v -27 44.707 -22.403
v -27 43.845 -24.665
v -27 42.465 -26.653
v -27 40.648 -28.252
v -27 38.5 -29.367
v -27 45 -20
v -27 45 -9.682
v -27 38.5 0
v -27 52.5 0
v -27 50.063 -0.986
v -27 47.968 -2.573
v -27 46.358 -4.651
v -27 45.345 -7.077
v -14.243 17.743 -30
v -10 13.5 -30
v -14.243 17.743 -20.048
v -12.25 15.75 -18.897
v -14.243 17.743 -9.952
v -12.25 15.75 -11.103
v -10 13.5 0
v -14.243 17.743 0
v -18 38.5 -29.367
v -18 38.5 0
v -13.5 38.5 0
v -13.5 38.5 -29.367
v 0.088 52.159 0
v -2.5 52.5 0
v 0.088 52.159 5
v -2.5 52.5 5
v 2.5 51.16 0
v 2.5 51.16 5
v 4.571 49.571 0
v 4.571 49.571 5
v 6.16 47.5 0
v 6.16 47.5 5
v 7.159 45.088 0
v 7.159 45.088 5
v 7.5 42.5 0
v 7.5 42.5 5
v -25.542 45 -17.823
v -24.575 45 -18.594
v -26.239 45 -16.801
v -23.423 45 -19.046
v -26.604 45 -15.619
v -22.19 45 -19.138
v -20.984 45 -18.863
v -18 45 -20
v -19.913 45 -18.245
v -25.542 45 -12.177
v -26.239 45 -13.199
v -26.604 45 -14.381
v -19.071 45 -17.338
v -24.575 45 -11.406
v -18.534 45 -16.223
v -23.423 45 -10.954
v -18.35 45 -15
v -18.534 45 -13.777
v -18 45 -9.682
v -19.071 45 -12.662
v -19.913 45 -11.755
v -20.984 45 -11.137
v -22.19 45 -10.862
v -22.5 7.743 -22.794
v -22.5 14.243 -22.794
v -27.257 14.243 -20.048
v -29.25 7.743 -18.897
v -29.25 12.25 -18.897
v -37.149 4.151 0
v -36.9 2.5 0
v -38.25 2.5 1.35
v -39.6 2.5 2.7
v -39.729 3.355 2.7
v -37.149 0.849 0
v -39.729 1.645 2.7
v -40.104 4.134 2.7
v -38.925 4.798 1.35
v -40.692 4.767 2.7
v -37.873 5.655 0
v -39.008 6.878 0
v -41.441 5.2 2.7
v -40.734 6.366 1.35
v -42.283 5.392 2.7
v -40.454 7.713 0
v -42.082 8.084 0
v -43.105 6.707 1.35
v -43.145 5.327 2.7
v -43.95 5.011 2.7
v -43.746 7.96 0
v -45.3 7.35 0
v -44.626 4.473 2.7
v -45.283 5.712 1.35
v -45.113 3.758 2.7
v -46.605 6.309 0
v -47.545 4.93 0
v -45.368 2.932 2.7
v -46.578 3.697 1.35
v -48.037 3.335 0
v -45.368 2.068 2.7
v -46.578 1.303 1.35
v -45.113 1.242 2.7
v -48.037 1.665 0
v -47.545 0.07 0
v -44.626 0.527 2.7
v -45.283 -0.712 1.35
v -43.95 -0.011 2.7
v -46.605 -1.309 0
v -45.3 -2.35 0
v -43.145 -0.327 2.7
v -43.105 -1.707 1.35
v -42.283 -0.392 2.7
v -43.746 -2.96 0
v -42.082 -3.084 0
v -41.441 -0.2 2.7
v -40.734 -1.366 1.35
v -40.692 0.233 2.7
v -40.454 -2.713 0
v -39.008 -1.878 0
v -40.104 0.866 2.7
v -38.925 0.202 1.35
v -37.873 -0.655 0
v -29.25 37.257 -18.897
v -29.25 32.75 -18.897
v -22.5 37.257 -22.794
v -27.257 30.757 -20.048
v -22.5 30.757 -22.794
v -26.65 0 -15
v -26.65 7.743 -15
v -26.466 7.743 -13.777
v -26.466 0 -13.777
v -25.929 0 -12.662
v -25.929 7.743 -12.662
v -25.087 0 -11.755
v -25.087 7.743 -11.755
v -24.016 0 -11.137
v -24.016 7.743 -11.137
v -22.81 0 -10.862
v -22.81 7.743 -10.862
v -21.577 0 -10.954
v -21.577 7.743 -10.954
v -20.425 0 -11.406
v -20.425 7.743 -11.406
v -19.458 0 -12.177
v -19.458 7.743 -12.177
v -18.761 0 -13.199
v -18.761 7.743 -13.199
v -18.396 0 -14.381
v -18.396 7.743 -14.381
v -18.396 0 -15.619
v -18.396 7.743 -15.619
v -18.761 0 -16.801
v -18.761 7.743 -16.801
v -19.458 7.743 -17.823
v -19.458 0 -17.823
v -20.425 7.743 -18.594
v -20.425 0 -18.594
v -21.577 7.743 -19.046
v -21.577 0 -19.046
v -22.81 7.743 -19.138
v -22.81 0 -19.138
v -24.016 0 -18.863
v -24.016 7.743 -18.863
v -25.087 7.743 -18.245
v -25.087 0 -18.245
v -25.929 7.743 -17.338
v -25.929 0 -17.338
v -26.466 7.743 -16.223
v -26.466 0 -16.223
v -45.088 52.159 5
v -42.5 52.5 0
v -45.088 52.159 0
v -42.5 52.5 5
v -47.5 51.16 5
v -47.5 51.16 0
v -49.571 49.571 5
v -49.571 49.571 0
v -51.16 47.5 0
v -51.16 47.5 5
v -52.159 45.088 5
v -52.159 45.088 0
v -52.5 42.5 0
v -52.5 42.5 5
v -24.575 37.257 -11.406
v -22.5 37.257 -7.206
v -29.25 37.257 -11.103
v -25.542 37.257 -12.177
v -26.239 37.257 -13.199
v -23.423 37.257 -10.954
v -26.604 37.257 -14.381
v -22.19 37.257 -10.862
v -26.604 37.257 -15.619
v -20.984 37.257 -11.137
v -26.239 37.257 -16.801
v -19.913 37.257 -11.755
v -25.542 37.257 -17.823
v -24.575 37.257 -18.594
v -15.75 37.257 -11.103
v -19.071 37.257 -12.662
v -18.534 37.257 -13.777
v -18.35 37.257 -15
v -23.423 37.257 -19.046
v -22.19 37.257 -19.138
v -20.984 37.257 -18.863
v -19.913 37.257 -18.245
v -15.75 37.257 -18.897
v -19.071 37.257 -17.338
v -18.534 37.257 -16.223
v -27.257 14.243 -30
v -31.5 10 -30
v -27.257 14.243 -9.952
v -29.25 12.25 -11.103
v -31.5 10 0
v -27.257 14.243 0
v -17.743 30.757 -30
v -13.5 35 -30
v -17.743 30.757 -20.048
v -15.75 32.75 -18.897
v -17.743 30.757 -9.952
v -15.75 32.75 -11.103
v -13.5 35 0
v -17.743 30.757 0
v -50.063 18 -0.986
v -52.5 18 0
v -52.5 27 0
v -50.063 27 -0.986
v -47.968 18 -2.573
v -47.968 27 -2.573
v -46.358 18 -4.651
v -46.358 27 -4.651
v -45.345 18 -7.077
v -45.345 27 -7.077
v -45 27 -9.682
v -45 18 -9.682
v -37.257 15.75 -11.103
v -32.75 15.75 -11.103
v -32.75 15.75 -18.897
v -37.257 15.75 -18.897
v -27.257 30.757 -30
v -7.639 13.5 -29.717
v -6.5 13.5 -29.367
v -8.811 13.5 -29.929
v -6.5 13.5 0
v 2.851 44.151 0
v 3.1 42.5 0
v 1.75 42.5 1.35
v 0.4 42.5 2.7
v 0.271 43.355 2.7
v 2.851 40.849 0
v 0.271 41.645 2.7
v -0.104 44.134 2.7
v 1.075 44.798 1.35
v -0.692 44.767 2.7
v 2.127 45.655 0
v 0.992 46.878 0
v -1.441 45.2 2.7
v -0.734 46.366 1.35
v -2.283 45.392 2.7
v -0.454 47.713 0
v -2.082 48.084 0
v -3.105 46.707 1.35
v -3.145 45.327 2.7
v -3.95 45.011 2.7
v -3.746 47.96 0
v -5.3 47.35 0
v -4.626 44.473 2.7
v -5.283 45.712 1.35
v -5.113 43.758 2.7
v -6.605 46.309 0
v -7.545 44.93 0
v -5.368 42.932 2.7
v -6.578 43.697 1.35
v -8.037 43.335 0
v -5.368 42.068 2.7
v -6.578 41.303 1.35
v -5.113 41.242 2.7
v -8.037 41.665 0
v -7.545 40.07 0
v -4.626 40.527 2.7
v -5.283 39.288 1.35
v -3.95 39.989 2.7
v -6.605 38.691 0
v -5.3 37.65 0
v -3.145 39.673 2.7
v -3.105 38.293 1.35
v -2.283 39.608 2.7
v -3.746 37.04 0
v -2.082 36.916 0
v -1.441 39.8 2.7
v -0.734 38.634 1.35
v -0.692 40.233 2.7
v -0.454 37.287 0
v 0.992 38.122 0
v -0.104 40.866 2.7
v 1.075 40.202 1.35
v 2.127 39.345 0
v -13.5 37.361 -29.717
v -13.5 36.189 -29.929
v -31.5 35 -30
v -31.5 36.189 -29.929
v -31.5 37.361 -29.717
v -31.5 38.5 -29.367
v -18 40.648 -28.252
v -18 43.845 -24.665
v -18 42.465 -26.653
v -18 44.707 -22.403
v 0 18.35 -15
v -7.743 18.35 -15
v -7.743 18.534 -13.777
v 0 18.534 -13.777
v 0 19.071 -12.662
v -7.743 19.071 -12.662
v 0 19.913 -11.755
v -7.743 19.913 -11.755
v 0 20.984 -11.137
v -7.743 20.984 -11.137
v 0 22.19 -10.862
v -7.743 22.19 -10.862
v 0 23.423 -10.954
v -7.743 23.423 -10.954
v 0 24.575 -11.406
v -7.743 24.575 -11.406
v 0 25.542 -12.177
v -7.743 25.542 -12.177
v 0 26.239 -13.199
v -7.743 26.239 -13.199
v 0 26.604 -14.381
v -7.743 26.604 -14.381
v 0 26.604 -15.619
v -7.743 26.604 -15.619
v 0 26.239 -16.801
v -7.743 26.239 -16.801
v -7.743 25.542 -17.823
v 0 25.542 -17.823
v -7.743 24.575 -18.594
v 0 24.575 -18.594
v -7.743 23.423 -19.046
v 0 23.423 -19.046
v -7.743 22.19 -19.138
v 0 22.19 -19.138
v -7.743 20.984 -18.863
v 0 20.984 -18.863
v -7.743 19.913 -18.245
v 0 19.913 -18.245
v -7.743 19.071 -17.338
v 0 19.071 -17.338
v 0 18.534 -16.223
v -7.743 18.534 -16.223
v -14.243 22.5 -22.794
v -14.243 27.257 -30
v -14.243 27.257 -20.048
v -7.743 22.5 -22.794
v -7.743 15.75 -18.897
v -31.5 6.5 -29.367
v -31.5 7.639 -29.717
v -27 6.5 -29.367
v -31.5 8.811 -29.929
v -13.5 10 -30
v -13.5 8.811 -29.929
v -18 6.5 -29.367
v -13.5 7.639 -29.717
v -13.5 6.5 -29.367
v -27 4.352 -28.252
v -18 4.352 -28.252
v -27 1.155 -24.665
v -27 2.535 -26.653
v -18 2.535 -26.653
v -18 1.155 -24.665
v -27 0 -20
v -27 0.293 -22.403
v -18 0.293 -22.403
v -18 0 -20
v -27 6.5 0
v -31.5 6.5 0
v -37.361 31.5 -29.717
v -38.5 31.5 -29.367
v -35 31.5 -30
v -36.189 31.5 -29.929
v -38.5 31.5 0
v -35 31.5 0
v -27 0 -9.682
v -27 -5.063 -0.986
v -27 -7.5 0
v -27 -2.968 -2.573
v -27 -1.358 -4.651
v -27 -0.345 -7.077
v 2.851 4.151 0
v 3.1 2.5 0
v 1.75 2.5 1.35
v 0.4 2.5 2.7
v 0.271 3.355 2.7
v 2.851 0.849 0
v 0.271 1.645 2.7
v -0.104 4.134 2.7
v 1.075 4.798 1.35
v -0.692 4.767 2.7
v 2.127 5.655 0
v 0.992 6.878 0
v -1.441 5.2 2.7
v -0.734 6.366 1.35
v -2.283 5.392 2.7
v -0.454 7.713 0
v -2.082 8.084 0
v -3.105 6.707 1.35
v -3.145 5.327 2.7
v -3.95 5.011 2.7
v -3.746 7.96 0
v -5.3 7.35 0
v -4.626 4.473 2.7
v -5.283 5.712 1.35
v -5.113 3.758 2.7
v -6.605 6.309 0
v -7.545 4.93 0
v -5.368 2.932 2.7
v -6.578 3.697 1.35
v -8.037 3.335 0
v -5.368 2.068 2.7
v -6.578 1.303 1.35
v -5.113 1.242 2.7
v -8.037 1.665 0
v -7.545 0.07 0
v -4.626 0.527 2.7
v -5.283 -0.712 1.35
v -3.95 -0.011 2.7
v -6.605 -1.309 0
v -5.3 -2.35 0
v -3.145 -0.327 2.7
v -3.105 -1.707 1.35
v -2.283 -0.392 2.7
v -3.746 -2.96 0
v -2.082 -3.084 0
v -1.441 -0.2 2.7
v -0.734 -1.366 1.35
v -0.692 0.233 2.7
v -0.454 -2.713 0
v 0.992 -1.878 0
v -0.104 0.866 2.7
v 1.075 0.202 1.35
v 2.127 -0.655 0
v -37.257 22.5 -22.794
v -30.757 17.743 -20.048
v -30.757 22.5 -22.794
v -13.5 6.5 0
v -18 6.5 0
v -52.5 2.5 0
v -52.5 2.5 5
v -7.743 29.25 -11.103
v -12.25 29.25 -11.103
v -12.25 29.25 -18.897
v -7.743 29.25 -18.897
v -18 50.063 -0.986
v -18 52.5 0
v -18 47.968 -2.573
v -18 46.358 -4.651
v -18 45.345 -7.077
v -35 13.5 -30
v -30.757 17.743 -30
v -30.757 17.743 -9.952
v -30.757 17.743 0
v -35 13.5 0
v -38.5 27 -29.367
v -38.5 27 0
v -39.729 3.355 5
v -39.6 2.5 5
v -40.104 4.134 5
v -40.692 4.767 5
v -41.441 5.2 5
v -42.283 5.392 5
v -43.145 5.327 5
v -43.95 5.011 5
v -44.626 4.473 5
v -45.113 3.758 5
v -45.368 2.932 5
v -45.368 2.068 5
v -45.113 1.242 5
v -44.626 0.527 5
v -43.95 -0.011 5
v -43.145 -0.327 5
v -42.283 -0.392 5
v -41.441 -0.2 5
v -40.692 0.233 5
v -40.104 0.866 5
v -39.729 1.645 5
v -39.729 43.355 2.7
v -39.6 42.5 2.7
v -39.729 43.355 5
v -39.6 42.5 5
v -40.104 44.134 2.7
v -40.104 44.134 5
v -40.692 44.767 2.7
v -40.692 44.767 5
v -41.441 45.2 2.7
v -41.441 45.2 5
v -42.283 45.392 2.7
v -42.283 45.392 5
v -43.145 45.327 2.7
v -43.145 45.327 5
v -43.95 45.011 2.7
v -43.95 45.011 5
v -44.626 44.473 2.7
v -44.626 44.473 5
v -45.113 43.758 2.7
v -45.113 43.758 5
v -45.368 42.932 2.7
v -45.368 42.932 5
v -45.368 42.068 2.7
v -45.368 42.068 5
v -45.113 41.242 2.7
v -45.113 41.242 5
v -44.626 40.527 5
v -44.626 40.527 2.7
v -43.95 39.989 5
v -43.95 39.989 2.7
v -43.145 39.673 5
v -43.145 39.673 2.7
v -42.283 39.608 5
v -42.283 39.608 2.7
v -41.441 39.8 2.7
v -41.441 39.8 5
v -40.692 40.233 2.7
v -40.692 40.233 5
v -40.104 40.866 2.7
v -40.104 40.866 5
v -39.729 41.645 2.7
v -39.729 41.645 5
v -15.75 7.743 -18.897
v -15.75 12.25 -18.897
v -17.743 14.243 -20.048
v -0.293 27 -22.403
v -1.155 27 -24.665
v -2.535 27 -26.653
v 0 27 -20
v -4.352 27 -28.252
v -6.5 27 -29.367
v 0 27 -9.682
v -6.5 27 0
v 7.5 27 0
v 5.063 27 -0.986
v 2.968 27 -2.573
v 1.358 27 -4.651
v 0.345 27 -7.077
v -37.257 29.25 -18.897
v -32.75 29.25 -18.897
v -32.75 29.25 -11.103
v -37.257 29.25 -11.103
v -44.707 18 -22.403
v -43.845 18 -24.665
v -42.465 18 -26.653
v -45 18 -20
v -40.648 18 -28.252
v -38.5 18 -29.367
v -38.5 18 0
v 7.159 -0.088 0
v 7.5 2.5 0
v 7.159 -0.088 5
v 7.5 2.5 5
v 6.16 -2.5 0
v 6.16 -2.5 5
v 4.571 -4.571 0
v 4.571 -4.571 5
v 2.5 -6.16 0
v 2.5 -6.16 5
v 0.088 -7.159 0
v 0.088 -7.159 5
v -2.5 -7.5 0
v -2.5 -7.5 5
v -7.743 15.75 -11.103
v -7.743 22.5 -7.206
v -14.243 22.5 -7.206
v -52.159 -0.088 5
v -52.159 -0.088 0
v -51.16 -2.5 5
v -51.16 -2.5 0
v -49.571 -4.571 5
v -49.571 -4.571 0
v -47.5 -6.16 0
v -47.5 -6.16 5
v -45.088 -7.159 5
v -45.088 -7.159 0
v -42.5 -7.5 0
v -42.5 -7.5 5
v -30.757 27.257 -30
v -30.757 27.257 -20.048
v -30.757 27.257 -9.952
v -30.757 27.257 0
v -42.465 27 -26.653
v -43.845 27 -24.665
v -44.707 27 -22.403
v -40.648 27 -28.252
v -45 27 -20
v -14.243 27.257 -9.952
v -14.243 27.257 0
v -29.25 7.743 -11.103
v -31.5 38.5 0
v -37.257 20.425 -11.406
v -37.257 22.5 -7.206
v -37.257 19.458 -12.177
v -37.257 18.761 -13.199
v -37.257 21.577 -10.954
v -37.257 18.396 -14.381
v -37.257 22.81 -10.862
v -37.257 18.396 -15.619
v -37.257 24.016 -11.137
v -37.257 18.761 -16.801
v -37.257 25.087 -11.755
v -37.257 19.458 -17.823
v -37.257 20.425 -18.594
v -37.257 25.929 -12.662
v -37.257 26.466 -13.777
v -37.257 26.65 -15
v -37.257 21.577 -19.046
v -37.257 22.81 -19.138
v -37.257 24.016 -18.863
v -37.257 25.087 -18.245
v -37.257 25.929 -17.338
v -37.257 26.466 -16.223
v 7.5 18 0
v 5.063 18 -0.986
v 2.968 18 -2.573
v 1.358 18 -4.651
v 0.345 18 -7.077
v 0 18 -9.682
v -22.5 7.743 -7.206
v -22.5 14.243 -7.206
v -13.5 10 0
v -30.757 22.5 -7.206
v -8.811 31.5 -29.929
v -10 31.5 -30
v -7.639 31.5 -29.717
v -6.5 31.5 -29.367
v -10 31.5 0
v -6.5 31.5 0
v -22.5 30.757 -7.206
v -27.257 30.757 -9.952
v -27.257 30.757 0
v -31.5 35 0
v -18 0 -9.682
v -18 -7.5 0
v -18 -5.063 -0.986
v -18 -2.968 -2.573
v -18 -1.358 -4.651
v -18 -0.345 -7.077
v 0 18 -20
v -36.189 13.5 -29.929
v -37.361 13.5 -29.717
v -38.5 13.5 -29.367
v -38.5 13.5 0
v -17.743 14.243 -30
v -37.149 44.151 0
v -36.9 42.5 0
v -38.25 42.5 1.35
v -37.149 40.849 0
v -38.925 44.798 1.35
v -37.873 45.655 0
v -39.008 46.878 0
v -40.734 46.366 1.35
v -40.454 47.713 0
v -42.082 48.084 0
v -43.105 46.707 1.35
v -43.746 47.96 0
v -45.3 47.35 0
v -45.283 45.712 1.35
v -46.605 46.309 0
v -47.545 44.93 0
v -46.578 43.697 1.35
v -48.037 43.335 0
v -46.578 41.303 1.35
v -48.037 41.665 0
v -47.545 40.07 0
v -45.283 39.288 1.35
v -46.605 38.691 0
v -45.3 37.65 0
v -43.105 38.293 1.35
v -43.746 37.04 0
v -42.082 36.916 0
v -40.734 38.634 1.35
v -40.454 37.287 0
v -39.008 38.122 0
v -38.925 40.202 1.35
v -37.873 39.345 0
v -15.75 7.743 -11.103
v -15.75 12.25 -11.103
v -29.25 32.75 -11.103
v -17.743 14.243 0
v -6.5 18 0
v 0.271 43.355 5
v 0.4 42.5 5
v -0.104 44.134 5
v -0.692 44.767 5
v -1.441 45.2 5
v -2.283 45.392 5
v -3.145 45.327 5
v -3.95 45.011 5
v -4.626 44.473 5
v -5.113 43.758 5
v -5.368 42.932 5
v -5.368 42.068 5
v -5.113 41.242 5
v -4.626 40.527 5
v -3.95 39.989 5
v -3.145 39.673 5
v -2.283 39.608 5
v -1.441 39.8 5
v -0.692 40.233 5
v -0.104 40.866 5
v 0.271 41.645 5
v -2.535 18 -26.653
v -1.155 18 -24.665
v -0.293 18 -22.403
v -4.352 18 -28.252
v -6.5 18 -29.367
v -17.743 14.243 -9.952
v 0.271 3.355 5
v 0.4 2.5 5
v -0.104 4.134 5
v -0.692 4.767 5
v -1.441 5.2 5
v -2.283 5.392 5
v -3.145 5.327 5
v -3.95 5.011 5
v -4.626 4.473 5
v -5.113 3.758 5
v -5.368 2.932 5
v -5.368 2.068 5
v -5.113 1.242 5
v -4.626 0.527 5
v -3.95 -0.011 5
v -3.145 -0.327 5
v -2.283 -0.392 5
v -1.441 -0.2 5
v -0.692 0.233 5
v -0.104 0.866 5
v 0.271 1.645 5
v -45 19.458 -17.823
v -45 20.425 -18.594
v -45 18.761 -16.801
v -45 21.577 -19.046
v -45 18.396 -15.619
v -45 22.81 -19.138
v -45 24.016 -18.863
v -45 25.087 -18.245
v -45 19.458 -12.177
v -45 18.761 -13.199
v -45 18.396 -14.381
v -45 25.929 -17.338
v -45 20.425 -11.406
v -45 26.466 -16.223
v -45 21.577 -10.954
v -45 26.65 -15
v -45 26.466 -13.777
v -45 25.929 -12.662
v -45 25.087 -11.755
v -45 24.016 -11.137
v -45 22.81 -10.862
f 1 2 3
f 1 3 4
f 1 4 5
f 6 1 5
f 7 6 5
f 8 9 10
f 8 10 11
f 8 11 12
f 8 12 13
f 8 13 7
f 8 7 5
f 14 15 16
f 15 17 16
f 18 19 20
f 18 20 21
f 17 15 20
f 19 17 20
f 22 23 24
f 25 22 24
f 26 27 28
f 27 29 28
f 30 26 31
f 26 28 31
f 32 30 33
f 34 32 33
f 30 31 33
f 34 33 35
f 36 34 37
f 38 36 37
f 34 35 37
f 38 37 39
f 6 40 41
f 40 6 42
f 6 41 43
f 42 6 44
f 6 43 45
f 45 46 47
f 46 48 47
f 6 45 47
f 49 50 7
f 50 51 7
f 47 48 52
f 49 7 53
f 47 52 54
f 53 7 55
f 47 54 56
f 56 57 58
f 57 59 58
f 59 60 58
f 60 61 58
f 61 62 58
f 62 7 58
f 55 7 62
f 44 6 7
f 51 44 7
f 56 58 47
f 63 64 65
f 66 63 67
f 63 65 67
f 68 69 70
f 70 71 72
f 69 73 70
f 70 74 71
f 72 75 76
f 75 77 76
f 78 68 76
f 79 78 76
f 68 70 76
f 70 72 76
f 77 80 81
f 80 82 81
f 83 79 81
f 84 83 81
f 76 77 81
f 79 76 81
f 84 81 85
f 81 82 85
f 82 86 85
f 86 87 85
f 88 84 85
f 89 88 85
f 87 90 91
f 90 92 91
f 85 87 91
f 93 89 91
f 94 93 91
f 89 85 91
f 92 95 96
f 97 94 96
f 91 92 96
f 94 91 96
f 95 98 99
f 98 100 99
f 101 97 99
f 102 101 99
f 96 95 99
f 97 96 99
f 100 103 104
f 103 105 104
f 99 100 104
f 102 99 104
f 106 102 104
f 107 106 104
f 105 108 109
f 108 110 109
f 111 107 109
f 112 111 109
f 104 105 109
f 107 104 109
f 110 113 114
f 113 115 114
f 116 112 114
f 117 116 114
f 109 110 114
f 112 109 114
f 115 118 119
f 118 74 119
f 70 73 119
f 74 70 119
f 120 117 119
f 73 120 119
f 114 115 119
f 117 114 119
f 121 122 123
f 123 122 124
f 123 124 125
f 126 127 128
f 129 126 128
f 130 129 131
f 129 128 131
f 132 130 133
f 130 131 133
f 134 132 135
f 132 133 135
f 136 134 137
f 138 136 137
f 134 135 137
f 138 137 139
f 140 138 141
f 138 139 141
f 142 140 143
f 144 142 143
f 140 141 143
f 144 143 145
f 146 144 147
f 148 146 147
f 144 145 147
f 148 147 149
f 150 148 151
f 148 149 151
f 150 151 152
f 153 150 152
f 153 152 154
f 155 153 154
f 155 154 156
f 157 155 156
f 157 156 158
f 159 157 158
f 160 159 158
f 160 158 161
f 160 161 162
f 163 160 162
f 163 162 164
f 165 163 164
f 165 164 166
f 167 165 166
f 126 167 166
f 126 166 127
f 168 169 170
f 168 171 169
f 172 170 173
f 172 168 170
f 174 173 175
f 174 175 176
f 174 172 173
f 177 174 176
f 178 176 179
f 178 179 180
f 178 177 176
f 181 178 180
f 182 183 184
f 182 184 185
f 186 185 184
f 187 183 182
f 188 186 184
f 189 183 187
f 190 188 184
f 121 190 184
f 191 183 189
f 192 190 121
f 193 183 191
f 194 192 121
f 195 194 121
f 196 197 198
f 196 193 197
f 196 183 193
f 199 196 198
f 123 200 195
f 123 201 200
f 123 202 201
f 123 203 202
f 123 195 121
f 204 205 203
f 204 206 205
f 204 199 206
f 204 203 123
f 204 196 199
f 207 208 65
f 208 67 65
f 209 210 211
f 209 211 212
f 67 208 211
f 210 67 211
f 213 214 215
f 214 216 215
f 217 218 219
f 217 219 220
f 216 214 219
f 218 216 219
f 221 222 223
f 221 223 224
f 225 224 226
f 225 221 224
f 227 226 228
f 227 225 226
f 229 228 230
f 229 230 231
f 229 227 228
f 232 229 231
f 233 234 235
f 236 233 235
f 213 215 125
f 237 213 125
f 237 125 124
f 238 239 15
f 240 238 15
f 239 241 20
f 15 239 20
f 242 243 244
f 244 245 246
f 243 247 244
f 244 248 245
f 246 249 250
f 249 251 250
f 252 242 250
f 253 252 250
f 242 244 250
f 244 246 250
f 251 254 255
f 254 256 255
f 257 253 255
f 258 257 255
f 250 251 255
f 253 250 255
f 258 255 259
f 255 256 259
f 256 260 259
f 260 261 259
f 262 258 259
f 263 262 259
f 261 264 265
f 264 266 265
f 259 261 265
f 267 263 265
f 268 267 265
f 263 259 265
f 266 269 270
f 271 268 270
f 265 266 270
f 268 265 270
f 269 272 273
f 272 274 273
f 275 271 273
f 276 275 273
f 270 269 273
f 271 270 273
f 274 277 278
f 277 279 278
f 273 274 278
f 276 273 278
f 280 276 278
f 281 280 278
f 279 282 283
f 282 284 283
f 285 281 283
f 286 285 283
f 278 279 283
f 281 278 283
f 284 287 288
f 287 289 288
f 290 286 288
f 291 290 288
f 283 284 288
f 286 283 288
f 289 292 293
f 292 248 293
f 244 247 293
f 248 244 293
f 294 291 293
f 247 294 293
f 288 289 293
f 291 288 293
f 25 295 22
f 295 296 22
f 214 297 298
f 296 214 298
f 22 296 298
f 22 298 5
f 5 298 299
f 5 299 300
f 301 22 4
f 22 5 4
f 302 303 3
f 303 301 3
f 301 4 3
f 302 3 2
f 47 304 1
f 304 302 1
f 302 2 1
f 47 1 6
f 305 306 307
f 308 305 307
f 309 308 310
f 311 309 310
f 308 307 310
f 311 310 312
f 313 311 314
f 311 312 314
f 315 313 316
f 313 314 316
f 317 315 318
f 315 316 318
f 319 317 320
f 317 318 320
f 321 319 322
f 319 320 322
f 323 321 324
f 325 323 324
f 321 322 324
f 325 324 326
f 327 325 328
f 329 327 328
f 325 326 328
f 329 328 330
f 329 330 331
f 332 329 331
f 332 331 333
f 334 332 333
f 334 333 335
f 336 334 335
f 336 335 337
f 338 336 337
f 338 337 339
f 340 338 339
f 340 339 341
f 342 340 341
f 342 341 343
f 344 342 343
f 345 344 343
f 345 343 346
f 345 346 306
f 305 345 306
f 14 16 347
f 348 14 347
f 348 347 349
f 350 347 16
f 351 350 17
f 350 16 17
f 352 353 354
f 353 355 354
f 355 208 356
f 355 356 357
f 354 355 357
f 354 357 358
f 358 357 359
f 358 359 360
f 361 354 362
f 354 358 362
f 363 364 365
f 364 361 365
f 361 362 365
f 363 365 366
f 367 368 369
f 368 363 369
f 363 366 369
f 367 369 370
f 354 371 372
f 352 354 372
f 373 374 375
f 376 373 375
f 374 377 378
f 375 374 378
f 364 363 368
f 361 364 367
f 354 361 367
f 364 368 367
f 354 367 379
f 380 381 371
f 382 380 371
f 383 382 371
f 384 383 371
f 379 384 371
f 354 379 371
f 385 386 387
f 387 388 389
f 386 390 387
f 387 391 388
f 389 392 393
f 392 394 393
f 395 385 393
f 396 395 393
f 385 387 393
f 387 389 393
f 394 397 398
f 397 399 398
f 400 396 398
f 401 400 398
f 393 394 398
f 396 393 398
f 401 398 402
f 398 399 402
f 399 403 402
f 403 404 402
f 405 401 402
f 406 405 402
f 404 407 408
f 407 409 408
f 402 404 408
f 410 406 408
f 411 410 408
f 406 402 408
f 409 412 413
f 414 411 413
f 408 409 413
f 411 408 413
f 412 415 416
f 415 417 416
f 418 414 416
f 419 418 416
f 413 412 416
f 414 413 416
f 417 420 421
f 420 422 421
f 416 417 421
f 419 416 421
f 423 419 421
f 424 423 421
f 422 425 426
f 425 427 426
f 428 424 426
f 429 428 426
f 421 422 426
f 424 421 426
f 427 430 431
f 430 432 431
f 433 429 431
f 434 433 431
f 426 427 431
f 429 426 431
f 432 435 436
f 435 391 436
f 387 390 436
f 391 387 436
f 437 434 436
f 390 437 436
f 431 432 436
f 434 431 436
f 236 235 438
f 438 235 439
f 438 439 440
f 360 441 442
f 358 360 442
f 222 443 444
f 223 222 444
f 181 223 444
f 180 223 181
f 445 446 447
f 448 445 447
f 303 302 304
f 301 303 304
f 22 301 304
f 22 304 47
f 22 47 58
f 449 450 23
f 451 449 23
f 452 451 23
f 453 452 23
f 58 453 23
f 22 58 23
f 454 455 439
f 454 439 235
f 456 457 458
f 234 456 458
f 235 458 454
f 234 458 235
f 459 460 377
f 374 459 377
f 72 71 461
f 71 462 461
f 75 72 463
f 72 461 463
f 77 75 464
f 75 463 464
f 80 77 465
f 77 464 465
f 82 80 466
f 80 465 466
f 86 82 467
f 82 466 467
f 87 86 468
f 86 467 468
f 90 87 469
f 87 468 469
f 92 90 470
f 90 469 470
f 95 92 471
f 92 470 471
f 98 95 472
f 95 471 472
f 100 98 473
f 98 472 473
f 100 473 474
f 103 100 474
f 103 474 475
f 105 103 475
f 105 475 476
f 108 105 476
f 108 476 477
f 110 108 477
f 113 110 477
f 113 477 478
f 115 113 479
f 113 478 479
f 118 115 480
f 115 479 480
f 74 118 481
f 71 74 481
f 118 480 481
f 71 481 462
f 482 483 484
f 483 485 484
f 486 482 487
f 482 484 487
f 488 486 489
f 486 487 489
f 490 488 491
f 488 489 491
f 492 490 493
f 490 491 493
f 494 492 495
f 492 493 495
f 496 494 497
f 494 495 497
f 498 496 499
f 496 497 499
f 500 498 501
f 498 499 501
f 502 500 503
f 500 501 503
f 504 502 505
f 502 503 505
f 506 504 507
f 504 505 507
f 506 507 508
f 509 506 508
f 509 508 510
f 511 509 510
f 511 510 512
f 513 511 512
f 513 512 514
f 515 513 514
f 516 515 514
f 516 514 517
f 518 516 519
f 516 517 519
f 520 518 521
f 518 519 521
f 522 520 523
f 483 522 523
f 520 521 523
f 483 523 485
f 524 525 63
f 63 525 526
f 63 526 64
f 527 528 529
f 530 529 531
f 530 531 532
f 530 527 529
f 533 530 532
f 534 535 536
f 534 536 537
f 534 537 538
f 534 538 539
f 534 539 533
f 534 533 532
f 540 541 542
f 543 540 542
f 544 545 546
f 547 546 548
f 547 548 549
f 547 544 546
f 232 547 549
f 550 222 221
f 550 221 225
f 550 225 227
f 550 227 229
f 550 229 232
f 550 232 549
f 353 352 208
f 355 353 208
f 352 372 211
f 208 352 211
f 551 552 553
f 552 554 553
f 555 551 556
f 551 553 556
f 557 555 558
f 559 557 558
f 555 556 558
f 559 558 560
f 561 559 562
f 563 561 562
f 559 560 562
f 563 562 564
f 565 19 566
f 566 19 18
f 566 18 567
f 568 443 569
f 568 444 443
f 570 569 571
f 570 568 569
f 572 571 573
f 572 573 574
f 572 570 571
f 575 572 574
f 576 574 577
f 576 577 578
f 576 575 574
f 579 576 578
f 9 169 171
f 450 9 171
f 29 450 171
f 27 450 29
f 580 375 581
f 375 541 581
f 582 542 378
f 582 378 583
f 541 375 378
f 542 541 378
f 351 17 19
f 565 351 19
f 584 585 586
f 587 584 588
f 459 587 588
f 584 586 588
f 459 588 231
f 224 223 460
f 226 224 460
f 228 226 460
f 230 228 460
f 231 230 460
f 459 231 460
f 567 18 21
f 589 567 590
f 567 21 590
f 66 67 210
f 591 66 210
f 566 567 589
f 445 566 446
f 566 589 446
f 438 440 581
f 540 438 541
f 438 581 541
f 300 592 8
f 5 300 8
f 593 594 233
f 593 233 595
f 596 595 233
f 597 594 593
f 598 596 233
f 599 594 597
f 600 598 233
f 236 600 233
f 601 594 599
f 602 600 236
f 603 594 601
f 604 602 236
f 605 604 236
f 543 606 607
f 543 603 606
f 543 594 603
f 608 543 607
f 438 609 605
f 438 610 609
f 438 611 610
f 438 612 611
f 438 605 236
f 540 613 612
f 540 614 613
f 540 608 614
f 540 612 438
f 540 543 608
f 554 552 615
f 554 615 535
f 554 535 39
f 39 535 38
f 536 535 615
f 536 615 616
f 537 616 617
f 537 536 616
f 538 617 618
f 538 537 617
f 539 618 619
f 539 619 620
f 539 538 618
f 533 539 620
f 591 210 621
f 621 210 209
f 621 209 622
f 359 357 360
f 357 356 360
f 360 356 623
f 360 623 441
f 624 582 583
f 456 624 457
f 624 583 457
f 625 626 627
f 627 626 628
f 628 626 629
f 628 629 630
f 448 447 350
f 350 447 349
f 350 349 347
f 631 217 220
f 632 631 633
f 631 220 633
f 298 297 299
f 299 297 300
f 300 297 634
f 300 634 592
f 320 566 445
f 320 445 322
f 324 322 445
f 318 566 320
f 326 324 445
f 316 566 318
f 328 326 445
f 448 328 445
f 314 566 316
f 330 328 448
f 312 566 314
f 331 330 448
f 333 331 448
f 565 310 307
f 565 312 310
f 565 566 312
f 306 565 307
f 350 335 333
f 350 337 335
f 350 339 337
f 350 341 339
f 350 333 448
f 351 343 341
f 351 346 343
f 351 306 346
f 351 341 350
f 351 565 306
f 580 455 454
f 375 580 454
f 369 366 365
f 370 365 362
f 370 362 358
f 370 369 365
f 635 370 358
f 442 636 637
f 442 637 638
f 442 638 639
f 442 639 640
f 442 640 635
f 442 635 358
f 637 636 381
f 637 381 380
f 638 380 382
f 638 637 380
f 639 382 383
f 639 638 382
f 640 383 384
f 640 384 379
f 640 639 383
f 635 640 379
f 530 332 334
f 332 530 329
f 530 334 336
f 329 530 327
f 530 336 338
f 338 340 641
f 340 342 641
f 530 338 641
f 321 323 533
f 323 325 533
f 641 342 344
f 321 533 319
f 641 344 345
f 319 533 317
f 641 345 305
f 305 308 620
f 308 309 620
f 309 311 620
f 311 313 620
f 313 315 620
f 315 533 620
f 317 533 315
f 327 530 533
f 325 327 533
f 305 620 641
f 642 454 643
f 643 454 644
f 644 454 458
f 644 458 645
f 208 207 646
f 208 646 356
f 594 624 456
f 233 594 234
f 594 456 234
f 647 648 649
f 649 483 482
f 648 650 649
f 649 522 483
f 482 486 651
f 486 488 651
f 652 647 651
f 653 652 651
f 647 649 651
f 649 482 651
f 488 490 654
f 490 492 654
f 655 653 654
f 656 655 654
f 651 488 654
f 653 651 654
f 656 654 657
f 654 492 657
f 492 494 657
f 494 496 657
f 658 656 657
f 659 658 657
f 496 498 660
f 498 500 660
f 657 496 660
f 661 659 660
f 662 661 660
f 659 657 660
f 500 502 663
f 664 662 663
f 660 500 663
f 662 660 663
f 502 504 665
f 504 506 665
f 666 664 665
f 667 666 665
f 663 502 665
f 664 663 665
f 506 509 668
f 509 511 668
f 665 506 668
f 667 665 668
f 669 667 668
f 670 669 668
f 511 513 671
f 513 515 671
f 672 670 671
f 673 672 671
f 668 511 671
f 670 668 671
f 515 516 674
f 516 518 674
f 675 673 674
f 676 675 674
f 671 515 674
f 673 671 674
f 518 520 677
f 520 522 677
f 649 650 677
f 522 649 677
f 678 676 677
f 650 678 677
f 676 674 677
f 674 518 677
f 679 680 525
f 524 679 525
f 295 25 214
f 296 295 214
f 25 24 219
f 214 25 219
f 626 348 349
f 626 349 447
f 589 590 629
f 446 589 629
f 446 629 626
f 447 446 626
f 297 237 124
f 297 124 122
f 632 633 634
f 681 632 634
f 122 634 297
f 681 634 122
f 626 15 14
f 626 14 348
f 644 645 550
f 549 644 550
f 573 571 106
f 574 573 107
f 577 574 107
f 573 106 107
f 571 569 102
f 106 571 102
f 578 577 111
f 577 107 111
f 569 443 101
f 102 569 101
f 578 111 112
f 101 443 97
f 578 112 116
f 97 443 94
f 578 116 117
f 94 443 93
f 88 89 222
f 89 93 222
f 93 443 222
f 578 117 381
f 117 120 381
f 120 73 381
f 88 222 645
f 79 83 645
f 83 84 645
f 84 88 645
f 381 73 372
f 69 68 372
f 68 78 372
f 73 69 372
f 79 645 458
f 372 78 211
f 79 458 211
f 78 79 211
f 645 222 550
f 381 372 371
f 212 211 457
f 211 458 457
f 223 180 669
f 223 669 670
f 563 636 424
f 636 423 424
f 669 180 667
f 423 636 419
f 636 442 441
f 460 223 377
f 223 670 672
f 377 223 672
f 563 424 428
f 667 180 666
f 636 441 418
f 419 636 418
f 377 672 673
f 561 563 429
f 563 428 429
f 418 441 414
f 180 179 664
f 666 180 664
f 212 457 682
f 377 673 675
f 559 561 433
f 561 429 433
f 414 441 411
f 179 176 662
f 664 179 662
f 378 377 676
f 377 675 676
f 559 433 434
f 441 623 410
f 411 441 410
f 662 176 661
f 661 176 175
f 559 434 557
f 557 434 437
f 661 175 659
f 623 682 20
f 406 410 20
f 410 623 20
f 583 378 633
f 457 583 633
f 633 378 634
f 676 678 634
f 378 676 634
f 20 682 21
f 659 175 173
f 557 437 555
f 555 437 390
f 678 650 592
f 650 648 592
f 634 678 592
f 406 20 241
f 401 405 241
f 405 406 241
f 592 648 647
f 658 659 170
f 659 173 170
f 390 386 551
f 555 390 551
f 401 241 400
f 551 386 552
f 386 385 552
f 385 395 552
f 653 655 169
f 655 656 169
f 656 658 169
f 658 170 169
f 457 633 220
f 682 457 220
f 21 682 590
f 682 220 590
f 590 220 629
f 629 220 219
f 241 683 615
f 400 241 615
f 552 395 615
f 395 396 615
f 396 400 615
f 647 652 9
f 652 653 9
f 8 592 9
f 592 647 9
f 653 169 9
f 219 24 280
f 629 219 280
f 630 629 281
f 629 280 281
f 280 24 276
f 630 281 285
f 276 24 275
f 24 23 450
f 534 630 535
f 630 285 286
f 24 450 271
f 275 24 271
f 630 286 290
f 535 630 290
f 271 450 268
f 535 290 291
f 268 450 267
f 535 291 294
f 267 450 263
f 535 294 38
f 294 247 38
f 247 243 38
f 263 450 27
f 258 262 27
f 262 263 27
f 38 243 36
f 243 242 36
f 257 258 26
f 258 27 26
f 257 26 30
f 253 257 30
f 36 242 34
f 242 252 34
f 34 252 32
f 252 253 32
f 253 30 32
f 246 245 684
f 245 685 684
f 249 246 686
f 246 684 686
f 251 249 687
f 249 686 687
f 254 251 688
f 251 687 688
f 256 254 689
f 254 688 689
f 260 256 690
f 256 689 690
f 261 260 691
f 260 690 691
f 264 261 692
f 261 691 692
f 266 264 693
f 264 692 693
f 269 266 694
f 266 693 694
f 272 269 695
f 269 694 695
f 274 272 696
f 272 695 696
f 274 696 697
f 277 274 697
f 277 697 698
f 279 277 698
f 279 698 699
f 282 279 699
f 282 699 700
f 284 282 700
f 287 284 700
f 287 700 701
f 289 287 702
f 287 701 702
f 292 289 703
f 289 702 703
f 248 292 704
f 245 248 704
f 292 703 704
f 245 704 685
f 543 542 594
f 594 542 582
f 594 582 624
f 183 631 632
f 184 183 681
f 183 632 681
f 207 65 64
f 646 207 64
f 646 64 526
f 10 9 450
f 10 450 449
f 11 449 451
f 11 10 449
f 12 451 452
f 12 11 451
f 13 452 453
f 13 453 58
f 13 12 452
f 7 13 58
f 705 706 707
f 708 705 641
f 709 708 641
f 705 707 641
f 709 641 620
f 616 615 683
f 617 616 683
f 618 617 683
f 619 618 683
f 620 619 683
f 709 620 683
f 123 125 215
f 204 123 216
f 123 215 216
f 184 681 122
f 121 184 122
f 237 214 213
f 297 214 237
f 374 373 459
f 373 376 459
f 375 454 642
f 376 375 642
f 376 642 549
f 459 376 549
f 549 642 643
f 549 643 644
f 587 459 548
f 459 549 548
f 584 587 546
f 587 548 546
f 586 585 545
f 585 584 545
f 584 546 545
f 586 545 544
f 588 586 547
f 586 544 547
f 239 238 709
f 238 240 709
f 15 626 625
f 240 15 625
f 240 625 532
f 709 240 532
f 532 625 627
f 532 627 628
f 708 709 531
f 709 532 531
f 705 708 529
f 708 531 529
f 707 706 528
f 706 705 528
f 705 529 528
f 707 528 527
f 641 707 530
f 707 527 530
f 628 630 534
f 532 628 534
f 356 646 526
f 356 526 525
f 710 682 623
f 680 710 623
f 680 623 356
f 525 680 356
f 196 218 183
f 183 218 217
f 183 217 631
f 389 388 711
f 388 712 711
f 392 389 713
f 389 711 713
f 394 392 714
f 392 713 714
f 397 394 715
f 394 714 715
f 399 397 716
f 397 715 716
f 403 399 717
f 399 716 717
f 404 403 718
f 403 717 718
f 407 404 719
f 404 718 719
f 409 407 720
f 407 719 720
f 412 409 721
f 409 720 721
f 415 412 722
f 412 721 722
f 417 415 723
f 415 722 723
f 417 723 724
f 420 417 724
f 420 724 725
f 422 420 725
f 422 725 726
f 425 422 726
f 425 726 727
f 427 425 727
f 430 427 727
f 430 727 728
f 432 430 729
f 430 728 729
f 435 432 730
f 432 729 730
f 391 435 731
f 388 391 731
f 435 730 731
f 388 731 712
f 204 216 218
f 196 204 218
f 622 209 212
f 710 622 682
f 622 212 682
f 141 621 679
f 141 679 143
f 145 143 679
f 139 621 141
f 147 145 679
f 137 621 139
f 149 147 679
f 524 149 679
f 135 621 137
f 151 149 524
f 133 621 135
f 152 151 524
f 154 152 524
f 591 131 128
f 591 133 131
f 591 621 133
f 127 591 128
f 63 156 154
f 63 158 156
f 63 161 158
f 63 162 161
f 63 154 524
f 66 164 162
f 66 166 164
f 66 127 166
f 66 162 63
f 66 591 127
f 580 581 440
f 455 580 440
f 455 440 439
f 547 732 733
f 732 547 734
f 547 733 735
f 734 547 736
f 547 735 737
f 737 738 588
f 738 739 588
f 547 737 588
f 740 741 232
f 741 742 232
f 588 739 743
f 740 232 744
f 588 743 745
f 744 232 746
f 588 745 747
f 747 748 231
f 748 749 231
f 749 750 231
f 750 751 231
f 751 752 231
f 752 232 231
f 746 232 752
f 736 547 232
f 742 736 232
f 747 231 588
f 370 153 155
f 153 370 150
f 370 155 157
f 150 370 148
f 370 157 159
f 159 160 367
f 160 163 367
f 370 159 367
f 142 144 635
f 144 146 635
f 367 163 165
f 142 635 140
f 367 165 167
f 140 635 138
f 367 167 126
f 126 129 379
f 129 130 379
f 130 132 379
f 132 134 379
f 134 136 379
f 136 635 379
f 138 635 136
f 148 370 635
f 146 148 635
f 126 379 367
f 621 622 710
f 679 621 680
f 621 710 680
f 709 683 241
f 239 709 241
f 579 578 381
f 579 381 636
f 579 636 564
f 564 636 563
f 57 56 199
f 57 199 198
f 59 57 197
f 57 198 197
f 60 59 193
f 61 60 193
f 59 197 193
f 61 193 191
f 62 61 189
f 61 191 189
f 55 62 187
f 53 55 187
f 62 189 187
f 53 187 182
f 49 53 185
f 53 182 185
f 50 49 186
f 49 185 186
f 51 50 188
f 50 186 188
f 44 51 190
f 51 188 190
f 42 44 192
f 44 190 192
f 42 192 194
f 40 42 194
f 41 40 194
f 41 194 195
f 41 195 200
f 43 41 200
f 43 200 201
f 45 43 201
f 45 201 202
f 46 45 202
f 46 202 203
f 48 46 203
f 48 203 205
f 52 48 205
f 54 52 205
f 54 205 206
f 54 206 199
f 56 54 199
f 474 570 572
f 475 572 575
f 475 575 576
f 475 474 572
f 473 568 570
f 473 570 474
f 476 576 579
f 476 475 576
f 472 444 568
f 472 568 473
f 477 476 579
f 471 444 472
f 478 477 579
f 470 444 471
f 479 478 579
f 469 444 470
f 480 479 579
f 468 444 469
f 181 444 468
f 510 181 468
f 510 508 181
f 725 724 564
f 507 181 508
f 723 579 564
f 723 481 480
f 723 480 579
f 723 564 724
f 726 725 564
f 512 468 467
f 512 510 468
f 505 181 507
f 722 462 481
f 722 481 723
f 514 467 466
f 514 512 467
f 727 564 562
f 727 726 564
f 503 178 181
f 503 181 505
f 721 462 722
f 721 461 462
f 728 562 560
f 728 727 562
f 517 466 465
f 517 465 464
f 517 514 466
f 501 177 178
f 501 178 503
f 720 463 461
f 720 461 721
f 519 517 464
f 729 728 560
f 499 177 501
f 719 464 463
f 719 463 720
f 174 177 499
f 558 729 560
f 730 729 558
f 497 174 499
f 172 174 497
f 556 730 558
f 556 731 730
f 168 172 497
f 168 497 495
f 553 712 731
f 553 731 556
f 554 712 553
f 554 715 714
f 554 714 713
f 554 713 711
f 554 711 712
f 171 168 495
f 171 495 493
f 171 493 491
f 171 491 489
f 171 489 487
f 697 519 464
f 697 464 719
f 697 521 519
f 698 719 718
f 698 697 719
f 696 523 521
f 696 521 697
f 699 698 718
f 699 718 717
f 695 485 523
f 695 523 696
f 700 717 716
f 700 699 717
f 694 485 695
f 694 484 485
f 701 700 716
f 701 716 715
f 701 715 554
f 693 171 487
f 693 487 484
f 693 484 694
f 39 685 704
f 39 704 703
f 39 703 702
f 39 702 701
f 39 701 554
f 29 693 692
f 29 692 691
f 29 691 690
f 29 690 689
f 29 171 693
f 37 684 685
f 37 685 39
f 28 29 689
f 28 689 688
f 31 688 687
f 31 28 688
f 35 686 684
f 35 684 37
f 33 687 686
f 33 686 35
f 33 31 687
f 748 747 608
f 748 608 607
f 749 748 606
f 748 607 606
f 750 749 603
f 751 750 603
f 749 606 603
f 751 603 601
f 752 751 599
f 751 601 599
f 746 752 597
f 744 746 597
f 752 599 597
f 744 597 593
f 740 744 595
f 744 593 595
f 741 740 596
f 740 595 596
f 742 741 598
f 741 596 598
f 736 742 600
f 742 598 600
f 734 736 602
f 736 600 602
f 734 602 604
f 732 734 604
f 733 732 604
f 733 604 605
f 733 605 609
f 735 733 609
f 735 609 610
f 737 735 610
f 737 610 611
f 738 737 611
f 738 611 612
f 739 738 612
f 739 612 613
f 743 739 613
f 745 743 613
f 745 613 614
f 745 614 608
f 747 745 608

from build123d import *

# Parameters (mm, degrees)
SKETCH1_W                                            = 60
SKETCH1_H                                            = 60
BOSS_EXTRUDE1_DEPTH                                  = 5
CSK_FOR_M5_HEX_SOCKET_COUNTERSUNK_CAP_SC_D           = 5.8
CSK_FOR_M5_HEX_SOCKET_COUNTERSUNK_CAP_SC_DEPTH       = 5
CSK_FOR_M5_HEX_SOCKET_COUNTERSUNK_CAP_SC_CSINK_D     = 11.2
CSK_FOR_M5_HEX_SOCKET_COUNTERSUNK_CAP_SC_CSINK_ANGLE = 90
CSK_FOR_M5_HEX_SOCKET_COUNTERSUNK_CAP_SC_TIP         = 1.742495795
BOSS_EXTRUDE2_DEPTH                                  = 30
FILLET1_R                                            = 10
CUT_EXTRUDE1_REACH                                   = 73.553
SKETCH11_R                                           = 4.15
CIRPATTERN1_COUNT                                    = 4
FILLET2_R                                            = 10
CUT_EXTRUDE2_DEPTH                                   = 6.5
CIRPATTERN2_COUNT                                    = 4


with BuildPart() as part:
    # Sketch1 → Boss-Extrude1 (new body)
    with BuildSketch(Plane.XY):
        with Locations((-22.5, 22.5)):
            Rectangle(SKETCH1_W, SKETCH1_H)
    extrude(amount=BOSS_EXTRUDE1_DEPTH)

    # CSK for M5 Hex Socket Countersunk Cap Screw1
    with Locations(Plane(origin=(0, 0, 0), x_dir=(-1, 0, 0), z_dir=(0, 0, -1))):
        with Locations((2.5, 42.5), (42.5, 42.5), (42.5, 2.5), (2.5, 2.5)):
            CounterSinkHole(CSK_FOR_M5_HEX_SOCKET_COUNTERSUNK_CAP_SC_D / 2, CSK_FOR_M5_HEX_SOCKET_COUNTERSUNK_CAP_SC_CSINK_D / 2, depth=CSK_FOR_M5_HEX_SOCKET_COUNTERSUNK_CAP_SC_DEPTH, counter_sink_angle=CSK_FOR_M5_HEX_SOCKET_COUNTERSUNK_CAP_SC_CSINK_ANGLE)
            with Locations((0, 0, -(CSK_FOR_M5_HEX_SOCKET_COUNTERSUNK_CAP_SC_DEPTH + CSK_FOR_M5_HEX_SOCKET_COUNTERSUNK_CAP_SC_TIP / 2))):  # 118° drill point
                Cone(0, CSK_FOR_M5_HEX_SOCKET_COUNTERSUNK_CAP_SC_D / 2, CSK_FOR_M5_HEX_SOCKET_COUNTERSUNK_CAP_SC_TIP, mode=Mode.SUBTRACT)

    # Sketch8 → Boss-Extrude2 (add)
    with BuildSketch(Plane(origin=(0, 0, 0), x_dir=(-1, 0, 0), z_dir=(0, 0, -1))):
        Polygon((27, 0), (27, 6.5), (31.5, 6.5), (31.5, 10), (27.257359313, 14.242640687), (17.742640687, 14.242640687), (13.5, 10), (13.5, 6.5), (18, 6.5), (18, 0), align=None)
        Polygon((0, 18), (6.5, 18), (6.5, 13.5), (10, 13.5), (14.242640687, 17.742640687), (14.242640687, 27.257359313), (10, 31.5), (6.5, 31.5), (6.5, 27), (0, 27), align=None)
        Polygon((18, 45), (18, 38.5), (13.5, 38.5), (13.5, 35), (17.742640687, 30.757359313), (27.257359313, 30.757359313), (31.5, 35), (31.5, 38.5), (27, 38.5), (27, 45), align=None)
        Polygon((45, 27), (38.5, 27), (38.5, 31.5), (35, 31.5), (30.757359313, 27.257359313), (30.757359313, 17.742640687), (35, 13.5), (38.5, 13.5), (38.5, 18), (45, 18), align=None)
    extrude(amount=BOSS_EXTRUDE2_DEPTH)

    # Fillet1
    # the kernel refuses this fillet: 10 mm, written as the material it adds along each edge
    with BuildSketch(Plane(origin=(-27, 45, 0), x_dir=(0, 1, 0), z_dir=(1, 0, 0)), Plane(origin=(-45, 18, 0), x_dir=(-1, 0, 0), z_dir=(0, 1, 0)), Plane(origin=(0, 27, 0), x_dir=(1, 0, 0), z_dir=(0, -1, 0)), Plane(origin=(-18, 0, 0), x_dir=(0, -1, 0), z_dir=(-1, 0, 0))) as fillet1_piece_1:
        with BuildLine():
            CenterArc((10, -9.682458366), FILLET1_R, 104.477512186, 75.522487814)
            Line((0, -9.682458366), (0, 0))
            Line((0, 0), (7.5, 0))
        make_face()
    extrude(amount=9)
    # the kernel refuses this fillet: 10 mm, written as the material it takes off along each edge
    with BuildSketch(Plane(origin=(-52, 45, -30), x_dir=(0, -1, 0), z_dir=(1, 0, 0)), Plane(origin=(7, 0, -30), x_dir=(0, 1, 0), z_dir=(-1, 0, 0))) as fillet1_2_piece_1:
        with BuildLine():
            CenterArc((FILLET1_R, -FILLET1_R), FILLET1_R, 90, 90)
            Line((0, -FILLET1_R), (0, 0))
            Line((0, 0), (FILLET1_R, 0))
        make_face()
    extrude(amount=59, mode=Mode.SUBTRACT)
    with BuildSketch(Plane(origin=(-45, -7, -30), x_dir=(0, 0, 1), z_dir=(0, 1, 0)), Plane(origin=(0, 52, -30), x_dir=(0, 0, 1), z_dir=(0, -1, 0))) as fillet1_2_piece_2:
        with BuildLine():
            CenterArc((FILLET1_R, FILLET1_R), FILLET1_R, 180, 90)
            Line((0, FILLET1_R), (0, 0))
            Line((0, 0), (FILLET1_R, 0))
        make_face()
    extrude(amount=59, mode=Mode.SUBTRACT)

    # Sketch11 → Cut-Extrude1 (cut, up to next)
    with BuildSketch(Plane(origin=(0, 14.242640687, 0), x_dir=(1, 0, 0), z_dir=(0, 1, 0)), mode=Mode.PRIVATE) as cut_extrude1_sk1:
        with Locations(Location((-22.5, 15, 0), (0, 0, 180))):
            Circle(SKETCH11_R)
    cut_extrude1_tool1 = extrude(cut_extrude1_sk1.sketch, amount=-CUT_EXTRUDE1_REACH, mode=Mode.PRIVATE) & part.part
    cut_extrude1 = cut_extrude1_tool1.solids().sort_by_distance((-22.5, 14.242641, -15))[0]
    add(cut_extrude1, mode=Mode.SUBTRACT)

    # CirPattern1: Cut-Extrude1 ×4 about axis
    cirpattern1_axis = Axis((-22.5, 22.5, 0), (0, 0, -1))
    for i in range(1, CIRPATTERN1_COUNT):
        add(cut_extrude1.rotate(cirpattern1_axis, i * 360 / CIRPATTERN1_COUNT), mode=Mode.SUBTRACT)

    # Fillet2
    fillet2_edges = [part.edges().sort_by_distance(p)[0] for p in [
        (7.5, 52.5, 2.5),
        (7.5, -7.5, 2.5),
        (-52.5, -7.5, 2.5),
        (-52.5, 52.5, 2.5),
    ]]
    fillet(fillet2_edges, radius=FILLET2_R)

    # Sketch12 → Cut-Extrude2 (cut)
    with BuildSketch(Plane(origin=(-30.757359313, 0, 0), x_dir=(0, 0, -1), z_dir=(1, 0, 0))):
        Polygon((11.102885683, 15.75), (18.897114317, 15.75), (22.794228634, 22.5), (18.897114317, 29.25), (11.102885683, 29.25), (7.205771366, 22.5), align=None)
    cut_extrude2 = extrude(amount=-CUT_EXTRUDE2_DEPTH, mode=Mode.SUBTRACT)

    # CirPattern2: Cut-Extrude2 ×4 about axis
    cirpattern2_axis = Axis((-22.5, 22.5, 0), (0, 0, 1))
    for i in range(1, CIRPATTERN2_COUNT):
        add(cut_extrude2.rotate(cirpattern2_axis, i * 360 / CIRPATTERN2_COUNT), mode=Mode.SUBTRACT)


solid = part.part
